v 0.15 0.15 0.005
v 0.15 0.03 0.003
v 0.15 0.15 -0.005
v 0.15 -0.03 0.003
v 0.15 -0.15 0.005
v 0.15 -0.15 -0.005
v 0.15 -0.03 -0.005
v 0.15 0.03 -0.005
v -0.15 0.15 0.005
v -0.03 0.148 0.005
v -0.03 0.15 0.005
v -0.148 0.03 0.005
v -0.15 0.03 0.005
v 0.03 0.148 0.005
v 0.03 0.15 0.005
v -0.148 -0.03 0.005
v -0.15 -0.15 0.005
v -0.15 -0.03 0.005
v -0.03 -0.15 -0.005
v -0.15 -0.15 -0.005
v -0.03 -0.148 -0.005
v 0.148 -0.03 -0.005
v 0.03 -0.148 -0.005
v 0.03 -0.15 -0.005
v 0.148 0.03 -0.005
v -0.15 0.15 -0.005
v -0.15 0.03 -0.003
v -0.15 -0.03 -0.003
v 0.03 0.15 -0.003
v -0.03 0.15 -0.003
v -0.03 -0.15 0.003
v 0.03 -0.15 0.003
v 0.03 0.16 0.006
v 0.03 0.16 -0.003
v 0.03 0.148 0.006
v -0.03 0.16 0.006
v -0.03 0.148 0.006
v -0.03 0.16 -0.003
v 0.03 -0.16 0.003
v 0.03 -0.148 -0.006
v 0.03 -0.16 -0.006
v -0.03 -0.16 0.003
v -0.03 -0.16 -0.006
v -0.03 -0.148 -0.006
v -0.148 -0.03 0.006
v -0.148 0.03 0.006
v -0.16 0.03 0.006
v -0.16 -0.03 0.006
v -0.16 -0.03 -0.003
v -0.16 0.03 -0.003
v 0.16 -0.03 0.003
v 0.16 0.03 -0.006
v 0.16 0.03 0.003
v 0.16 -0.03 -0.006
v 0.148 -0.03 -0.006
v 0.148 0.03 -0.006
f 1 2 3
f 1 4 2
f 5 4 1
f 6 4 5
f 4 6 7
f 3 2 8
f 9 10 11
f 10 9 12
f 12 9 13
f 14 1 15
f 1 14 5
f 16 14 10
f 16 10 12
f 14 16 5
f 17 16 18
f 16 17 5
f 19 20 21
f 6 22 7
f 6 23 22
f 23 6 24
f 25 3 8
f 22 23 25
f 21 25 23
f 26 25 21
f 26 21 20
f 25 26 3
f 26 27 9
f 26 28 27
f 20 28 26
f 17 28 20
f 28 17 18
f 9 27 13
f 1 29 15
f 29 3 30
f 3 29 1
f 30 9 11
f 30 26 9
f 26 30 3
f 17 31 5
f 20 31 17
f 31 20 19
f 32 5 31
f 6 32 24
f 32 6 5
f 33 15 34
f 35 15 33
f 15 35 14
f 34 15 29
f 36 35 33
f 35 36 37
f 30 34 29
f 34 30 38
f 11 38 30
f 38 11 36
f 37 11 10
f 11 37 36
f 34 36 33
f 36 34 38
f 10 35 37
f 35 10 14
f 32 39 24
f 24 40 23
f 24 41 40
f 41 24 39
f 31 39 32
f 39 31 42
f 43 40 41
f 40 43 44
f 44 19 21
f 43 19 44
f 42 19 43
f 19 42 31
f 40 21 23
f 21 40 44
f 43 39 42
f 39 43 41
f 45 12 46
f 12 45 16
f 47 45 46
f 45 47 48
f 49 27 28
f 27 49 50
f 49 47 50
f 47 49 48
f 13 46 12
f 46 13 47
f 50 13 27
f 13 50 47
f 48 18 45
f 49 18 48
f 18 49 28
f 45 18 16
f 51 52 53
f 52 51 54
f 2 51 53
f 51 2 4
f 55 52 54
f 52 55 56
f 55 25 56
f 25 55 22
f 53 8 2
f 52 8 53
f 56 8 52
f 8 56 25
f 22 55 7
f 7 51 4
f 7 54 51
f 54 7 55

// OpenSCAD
// Thin keyed plate with asymmetric tabs on opposite Z faces
// Goal: one connected solid; visible asymmetry between front/back and left/right views.

// Parameters (mm)
plate_W = 0.30;
plate_H = 0.30;
plate_T = 0.01;

// Tab sizes
tab_out    = 0.01;   // protrusion outward from edge (in XY)
tab_w      = 0.06;   // width of top/bottom tabs (along X)
tab_side_h = 0.06;   // height of side tabs (along Y)

// Make face-specific tabs clearly visible in orthographic views
tab_face_T = plate_T * 0.90;   // thickness of a tab on one face (along Z)

// Small overlap to guarantee manifold union
overlap = 0.001;

// Base plate
module base_plate() {
    cube([plate_W, plate_H, plate_T], center=true);
}

// Helper: Z-center for a tab that sits on +Z or -Z face and overlaps into plate
function zc(sign) = sign * (plate_T/2 - tab_face_T/2 + overlap);

// +Y edge tab on +Z face (front)
module top_tab_front_face() {
    translate([0,
               plate_H/2 + tab_out/2 - overlap,
               zc(+1)])
        cube([tab_w, tab_out + 2*overlap, tab_face_T], center=true);
}

// -Y edge tab on -Z face (back)
module bottom_tab_back_face() {
    translate([0,
               -(plate_H/2 + tab_out/2 - overlap),
               zc(-1)])
        cube([tab_w, tab_out + 2*overlap, tab_face_T], center=true);
}

// -X edge tab on +Z face (front)
module left_mid_tab_front_face() {
    translate([-(plate_W/2 + tab_out/2 - overlap),
               0,
               zc(+1)])
        cube([tab_out + 2*overlap, tab_side_h, tab_face_T], center=true);
}

// +X edge tab on -Z face (back)
module right_mid_tab_back_face() {
    translate([+(plate_W/2 + tab_out/2 - overlap),
               0,
               zc(-1)])
        cube([tab_out + 2*overlap, tab_side_h, tab_face_T], center=true);
}

// Final connected solid
union() {
    base_plate();
    top_tab_front_face();
    bottom_tab_back_face();
    left_mid_tab_front_face();
    right_mid_tab_back_face();
}
